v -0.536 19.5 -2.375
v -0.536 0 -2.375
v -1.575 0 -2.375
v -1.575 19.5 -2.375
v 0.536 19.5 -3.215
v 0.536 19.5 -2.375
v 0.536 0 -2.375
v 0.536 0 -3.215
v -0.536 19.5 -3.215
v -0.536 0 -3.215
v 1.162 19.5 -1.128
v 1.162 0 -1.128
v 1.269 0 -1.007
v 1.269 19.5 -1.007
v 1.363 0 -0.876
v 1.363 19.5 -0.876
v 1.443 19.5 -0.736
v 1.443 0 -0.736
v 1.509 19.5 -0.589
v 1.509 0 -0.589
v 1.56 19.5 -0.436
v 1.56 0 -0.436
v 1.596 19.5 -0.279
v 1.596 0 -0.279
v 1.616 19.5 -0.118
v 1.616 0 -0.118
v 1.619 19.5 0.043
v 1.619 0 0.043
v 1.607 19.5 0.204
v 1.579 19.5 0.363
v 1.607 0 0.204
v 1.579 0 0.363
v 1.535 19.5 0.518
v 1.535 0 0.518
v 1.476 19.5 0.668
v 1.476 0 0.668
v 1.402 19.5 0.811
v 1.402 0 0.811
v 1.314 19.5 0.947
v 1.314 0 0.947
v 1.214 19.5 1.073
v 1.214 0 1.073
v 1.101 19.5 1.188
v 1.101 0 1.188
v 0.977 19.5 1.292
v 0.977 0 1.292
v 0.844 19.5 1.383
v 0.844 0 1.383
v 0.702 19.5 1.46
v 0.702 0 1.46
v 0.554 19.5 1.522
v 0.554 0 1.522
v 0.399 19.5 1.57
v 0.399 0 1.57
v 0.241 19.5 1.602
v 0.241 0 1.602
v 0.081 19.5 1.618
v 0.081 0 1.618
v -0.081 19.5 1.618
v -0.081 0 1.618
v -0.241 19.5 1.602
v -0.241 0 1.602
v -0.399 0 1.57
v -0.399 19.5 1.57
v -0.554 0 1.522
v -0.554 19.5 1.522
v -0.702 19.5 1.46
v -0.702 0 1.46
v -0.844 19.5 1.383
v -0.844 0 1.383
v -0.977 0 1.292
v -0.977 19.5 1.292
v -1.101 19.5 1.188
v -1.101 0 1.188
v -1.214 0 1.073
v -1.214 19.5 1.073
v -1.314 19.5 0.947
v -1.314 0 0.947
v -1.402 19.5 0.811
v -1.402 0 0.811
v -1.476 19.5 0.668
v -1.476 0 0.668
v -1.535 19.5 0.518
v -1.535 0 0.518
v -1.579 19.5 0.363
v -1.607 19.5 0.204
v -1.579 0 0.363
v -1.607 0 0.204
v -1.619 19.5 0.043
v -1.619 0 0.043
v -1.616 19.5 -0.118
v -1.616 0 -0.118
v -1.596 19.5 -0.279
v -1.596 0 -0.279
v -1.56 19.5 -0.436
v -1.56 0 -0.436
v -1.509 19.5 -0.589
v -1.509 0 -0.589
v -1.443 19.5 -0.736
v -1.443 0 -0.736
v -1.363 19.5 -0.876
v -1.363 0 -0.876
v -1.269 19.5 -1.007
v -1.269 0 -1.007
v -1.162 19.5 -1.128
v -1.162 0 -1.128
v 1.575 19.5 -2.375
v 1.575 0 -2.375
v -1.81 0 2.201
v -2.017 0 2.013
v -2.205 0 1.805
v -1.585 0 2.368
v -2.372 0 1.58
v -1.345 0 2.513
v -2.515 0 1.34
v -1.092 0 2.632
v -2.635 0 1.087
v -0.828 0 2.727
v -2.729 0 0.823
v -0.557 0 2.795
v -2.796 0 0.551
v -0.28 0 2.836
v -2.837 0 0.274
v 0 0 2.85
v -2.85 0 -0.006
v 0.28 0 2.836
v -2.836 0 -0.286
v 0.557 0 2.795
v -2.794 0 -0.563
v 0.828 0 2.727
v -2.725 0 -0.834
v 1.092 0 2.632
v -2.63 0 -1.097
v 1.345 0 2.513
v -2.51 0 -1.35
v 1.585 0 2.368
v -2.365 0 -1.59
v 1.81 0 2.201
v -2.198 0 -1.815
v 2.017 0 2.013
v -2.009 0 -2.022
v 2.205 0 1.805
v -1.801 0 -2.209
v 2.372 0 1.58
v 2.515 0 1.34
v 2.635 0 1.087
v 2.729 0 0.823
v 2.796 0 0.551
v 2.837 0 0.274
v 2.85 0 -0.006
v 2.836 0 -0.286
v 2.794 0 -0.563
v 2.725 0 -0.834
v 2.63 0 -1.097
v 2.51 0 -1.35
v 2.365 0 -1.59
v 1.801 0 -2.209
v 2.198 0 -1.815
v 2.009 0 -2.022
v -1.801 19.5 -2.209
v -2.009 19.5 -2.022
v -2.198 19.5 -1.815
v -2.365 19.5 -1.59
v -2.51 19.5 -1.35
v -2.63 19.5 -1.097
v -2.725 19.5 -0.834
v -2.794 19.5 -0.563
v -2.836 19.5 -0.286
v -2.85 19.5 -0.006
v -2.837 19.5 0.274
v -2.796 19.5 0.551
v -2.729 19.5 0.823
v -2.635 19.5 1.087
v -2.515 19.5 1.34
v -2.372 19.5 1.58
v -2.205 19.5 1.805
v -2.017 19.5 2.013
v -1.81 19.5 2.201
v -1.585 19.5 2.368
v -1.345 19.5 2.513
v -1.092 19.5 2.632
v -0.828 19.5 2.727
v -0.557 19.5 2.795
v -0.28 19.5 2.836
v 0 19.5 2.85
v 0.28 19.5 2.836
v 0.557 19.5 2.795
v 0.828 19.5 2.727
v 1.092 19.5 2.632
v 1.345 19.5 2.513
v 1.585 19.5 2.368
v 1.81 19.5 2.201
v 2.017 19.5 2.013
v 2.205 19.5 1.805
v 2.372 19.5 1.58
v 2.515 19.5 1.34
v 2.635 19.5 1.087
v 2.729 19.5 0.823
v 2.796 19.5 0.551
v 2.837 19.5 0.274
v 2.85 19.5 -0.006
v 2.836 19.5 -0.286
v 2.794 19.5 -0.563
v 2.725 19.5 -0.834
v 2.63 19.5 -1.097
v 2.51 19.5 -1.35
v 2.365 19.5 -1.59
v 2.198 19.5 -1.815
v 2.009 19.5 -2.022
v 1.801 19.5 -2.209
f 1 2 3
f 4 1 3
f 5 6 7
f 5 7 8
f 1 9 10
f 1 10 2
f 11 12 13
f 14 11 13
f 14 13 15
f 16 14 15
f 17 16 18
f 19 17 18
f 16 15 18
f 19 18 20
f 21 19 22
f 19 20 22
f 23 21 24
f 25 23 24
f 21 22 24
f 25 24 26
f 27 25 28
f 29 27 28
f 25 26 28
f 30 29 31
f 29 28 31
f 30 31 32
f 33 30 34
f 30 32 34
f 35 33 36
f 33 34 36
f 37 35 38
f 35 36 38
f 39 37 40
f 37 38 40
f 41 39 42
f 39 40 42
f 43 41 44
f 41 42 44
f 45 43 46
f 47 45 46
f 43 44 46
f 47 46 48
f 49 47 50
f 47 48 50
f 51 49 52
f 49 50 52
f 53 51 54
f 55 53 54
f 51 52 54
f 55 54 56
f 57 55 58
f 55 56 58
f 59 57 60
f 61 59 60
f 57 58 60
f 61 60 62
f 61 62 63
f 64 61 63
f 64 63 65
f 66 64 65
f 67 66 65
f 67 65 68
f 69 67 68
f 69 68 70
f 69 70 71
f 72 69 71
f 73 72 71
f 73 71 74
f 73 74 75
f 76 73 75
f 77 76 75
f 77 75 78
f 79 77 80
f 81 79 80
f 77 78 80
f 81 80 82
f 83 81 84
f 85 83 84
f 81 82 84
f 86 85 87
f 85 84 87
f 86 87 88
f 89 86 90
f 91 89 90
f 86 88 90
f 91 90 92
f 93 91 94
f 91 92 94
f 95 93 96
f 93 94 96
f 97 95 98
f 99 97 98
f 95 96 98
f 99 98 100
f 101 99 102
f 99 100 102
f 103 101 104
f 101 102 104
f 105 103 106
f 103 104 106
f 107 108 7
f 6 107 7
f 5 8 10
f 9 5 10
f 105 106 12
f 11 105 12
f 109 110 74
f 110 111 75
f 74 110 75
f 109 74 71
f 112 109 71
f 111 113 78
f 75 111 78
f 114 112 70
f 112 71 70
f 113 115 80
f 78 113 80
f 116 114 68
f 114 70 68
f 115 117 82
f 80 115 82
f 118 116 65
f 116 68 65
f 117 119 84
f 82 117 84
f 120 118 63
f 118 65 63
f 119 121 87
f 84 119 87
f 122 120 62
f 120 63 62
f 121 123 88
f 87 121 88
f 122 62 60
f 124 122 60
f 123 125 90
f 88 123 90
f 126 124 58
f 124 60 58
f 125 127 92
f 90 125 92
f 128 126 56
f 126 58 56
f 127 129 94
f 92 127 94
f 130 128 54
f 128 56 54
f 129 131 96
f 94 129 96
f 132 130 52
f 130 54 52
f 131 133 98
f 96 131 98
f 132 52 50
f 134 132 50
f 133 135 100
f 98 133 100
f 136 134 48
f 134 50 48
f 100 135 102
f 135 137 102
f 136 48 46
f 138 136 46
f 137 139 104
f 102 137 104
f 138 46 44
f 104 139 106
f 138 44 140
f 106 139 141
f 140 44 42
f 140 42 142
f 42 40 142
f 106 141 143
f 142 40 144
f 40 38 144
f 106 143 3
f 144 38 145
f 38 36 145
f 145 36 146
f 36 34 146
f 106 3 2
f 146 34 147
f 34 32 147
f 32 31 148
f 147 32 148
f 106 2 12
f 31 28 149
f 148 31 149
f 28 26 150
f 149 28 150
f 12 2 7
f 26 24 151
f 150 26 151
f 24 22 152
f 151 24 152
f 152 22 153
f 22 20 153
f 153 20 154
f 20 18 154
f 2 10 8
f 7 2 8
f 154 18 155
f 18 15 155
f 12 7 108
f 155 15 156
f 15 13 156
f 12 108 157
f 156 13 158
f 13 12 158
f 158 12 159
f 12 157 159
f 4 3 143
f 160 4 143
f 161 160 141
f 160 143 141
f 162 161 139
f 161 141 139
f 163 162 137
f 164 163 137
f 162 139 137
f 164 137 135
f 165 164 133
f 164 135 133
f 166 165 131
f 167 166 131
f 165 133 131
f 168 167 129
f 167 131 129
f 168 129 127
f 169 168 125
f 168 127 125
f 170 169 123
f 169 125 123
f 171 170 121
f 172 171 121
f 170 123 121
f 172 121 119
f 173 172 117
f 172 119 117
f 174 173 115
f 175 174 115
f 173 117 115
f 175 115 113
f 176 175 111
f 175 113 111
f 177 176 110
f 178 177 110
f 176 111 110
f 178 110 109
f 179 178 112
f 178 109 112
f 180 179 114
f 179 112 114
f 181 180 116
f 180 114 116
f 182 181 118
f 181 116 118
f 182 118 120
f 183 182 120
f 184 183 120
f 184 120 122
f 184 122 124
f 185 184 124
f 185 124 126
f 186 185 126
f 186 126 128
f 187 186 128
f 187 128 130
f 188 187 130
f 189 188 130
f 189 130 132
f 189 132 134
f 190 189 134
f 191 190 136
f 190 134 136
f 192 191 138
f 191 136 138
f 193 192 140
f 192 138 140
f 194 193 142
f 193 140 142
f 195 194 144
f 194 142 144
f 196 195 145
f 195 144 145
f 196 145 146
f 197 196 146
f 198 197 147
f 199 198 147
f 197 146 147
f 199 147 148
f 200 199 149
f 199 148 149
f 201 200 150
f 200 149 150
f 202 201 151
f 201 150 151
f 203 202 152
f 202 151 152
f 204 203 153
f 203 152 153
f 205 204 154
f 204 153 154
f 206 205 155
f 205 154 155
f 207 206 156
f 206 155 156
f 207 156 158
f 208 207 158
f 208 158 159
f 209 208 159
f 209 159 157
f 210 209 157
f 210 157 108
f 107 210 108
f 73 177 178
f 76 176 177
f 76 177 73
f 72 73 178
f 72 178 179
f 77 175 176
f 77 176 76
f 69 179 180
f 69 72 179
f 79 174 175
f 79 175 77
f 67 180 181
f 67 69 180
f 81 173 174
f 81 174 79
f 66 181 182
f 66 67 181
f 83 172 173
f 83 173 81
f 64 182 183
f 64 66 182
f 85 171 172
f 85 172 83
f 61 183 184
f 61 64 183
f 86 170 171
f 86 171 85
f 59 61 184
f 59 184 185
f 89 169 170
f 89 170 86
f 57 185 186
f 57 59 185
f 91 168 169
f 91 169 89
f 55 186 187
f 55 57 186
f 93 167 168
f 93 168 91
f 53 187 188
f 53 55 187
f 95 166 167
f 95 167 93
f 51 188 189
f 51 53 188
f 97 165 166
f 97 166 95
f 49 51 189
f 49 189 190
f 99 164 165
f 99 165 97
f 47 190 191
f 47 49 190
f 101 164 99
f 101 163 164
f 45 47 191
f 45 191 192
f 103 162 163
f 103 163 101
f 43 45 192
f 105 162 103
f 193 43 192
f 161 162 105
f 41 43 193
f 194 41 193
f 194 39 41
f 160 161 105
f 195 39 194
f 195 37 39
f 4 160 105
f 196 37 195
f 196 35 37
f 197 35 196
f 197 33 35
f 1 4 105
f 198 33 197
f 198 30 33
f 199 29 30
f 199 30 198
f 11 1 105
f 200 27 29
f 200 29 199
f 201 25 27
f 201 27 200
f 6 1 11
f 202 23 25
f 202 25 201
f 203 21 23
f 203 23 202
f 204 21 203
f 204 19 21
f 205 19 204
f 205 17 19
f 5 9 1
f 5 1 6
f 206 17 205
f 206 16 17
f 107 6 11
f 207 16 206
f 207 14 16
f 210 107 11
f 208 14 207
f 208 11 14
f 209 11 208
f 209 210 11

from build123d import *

# Parameters (mm, degrees)
EXTRUDE_1_DEPTH = 19.5


with BuildPart() as part:
    # 草图1 → 凸台-拉伸1 (new body)
    with BuildSketch(Plane(origin=(0, 0, 0), x_dir=(1, 0, 0), z_dir=(0, 1, 0))):
        with BuildLine():
            Line((-0.536355181, 3.215077001), (-0.536355181, 2.375))
            Line((-0.536355181, 2.375), (-1.575396775, 2.375))
            ThreePointArc((-1.575396775, 2.375), (0, -2.85), (1.575396775, 2.375))
            Line((1.575396775, 2.375), (0.536355181, 2.375))
            Line((0.536355181, 2.375), (0.536355181, 3.215077001))
            Line((0.536355181, 3.215077001), (-0.536355181, 3.215077001))
        make_face()
        with BuildLine():
            ThreePointArc((1.162358254, 1.128416275), (0, -1.62), (-1.162358254, 1.128416275))
            Line((-1.162358254, 1.128416275), (1.162358254, 1.128416275))
        make_face(mode=Mode.SUBTRACT)
    extrude(amount=EXTRUDE_1_DEPTH)


solid = part.part
